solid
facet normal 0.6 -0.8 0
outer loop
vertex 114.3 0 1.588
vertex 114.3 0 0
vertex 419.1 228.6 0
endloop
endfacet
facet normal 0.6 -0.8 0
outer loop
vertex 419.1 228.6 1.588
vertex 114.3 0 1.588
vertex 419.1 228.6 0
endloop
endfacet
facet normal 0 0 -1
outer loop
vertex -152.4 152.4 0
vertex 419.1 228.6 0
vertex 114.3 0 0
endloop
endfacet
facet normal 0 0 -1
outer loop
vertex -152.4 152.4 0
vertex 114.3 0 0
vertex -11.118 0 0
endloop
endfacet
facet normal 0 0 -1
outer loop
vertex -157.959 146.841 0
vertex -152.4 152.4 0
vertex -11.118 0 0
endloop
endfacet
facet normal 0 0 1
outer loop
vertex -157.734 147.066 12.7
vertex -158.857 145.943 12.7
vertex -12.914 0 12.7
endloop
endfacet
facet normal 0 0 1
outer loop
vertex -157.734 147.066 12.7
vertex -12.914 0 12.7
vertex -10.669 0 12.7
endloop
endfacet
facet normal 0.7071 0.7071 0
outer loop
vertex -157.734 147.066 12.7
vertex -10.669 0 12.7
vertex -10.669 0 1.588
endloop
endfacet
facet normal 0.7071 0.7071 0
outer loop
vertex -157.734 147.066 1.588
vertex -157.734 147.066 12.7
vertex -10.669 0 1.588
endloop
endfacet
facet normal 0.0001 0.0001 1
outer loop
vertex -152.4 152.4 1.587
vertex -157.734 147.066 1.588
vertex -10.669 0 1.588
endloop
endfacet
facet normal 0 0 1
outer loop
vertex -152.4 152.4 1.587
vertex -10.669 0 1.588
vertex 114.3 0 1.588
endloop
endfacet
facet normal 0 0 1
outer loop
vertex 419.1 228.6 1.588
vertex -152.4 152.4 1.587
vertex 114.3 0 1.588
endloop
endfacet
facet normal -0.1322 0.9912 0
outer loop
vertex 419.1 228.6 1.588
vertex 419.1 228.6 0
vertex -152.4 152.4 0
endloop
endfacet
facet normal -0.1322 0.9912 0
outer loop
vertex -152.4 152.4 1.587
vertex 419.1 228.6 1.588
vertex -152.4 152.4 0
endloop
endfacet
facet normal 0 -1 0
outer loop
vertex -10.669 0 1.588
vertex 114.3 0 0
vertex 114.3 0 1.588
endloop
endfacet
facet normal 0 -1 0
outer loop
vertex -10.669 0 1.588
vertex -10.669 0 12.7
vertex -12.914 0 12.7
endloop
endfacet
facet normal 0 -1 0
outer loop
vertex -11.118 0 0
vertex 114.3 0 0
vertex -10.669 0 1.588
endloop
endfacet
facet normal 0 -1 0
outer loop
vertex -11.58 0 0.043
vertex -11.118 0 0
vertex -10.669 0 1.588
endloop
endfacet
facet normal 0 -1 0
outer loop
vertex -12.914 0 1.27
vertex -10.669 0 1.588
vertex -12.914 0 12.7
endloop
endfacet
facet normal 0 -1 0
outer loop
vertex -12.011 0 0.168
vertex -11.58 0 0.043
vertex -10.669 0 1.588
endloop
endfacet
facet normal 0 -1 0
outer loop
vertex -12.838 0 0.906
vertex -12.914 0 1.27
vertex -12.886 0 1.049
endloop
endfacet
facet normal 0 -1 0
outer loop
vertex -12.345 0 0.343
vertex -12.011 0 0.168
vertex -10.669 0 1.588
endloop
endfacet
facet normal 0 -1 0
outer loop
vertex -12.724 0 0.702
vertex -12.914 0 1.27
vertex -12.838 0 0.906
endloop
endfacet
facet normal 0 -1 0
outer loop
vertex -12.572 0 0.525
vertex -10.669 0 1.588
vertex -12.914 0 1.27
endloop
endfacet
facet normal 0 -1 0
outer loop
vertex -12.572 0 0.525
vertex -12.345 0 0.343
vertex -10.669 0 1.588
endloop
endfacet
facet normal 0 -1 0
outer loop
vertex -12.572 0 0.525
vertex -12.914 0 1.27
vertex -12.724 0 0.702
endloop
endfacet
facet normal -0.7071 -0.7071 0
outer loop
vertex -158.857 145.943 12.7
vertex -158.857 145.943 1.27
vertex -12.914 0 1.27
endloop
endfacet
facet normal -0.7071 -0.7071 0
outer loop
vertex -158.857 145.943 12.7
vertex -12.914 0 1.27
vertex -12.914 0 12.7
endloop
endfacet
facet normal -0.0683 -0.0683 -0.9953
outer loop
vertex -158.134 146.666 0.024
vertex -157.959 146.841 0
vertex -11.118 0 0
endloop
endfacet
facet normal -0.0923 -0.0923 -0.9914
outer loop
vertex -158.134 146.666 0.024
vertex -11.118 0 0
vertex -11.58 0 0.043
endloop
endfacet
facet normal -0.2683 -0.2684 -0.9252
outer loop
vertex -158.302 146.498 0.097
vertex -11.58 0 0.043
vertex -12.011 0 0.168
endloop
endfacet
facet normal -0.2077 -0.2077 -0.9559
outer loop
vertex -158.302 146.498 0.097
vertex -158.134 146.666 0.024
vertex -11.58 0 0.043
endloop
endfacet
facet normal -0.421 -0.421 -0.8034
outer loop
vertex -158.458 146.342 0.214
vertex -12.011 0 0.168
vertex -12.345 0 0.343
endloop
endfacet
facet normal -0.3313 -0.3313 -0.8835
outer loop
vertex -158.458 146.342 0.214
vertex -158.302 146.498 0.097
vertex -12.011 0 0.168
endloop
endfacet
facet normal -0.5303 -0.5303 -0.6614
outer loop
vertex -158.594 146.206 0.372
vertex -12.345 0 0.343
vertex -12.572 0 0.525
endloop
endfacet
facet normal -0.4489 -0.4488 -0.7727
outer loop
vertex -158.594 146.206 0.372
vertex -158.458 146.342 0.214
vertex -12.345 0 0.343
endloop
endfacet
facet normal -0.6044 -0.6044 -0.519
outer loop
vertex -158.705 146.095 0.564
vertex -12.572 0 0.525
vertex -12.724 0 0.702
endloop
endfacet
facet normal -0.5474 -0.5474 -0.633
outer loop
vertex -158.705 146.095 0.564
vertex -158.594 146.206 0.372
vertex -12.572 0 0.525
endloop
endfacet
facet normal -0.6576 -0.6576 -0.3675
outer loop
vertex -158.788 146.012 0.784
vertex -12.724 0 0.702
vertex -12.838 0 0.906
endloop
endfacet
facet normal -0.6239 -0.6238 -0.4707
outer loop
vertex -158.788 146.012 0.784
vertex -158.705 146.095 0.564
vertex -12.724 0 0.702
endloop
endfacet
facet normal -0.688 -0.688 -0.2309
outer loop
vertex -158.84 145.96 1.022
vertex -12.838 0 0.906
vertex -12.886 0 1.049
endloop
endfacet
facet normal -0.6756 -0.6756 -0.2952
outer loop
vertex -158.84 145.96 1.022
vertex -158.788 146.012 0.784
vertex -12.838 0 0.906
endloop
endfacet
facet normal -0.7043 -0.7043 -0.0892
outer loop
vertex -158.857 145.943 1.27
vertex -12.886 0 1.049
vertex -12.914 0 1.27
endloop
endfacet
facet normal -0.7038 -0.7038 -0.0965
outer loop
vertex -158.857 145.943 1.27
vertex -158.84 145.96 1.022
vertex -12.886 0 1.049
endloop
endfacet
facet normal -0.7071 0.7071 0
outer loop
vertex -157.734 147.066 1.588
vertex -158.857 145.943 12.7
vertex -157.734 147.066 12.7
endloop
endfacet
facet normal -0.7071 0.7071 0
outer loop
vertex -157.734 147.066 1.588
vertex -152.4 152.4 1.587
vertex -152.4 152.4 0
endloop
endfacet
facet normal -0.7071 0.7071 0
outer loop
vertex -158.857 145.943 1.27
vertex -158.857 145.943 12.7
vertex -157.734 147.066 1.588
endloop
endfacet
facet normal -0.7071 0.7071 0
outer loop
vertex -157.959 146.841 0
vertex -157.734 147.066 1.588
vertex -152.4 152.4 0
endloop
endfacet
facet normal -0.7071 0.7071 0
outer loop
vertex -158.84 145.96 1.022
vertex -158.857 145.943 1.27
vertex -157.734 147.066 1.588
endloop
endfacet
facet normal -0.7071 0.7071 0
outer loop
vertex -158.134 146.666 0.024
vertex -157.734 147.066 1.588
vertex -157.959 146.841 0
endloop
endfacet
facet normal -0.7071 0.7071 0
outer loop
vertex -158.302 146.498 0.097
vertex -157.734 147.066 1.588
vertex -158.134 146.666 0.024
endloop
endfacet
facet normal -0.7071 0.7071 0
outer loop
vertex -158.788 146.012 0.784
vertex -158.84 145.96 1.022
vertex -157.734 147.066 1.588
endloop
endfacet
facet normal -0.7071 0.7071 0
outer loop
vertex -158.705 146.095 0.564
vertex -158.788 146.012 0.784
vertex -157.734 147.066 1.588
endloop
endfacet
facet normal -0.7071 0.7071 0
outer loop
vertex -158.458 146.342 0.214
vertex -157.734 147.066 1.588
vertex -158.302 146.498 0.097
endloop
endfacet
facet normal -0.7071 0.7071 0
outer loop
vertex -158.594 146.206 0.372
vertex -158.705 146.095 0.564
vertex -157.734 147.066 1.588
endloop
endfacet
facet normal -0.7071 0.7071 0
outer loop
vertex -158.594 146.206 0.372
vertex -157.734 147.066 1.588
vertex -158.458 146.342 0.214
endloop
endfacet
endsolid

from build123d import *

# Parameters (mm, degrees)
BOSS_EXTRUDE1_DEPTH = 1.5875
BOSS_EXTRUDE2_DEPTH = 215.526147
CUT_EXTRUDE1_DEPTH  = 12.7


with BuildPart() as part:
    # Sketch2 → Boss-Extrude1 (new body)
    with BuildSketch(Plane.XY):
        Polygon((0, 0), (114.3, 0), (419.1, 228.6), (-152.4, 152.4), align=None)
    extrude(amount=BOSS_EXTRUDE1_DEPTH)

    # Sketch6 → Boss-Extrude2 (add)
    with BuildSketch(Plane(origin=(-152.4, 152.4, 0), x_dir=(0, 0, -1), z_dir=(-0.7071067811865476, 0.7071067811865476, 0))):
        with BuildLine():
            Line((0, 7.5438), (0, 7.8613))
            ThreePointArc((0, 7.8613), (-0.371974388, 8.759325612), (-1.27, 9.1313))
            Line((-1.27, 9.1313), (-12.7, 9.1313))
            Line((-12.7, 9.1313), (-12.7, 7.5438))
            Line((-12.7, 7.5438), (-1.5875, 7.5438))
            Line((-1.5875, 7.5438), (-1.5875, 0))
            Line((-1.5875, 0), (0, 0))
            Line((0, 0), (0, 7.5438))
        make_face()
    extrude(amount=-BOSS_EXTRUDE2_DEPTH)

    # Sketch7 → Cut-Extrude1 (cut)
    with BuildSketch(Plane(origin=(0, 0, 0), x_dir=(-1, 0, 0), z_dir=(0, 0, -1))):
        Polygon((0, 0), (12.913608302, 0), (6.456804151, -6.456804151), align=None)
    extrude(amount=-CUT_EXTRUDE1_DEPTH, mode=Mode.SUBTRACT)


solid = part.part
